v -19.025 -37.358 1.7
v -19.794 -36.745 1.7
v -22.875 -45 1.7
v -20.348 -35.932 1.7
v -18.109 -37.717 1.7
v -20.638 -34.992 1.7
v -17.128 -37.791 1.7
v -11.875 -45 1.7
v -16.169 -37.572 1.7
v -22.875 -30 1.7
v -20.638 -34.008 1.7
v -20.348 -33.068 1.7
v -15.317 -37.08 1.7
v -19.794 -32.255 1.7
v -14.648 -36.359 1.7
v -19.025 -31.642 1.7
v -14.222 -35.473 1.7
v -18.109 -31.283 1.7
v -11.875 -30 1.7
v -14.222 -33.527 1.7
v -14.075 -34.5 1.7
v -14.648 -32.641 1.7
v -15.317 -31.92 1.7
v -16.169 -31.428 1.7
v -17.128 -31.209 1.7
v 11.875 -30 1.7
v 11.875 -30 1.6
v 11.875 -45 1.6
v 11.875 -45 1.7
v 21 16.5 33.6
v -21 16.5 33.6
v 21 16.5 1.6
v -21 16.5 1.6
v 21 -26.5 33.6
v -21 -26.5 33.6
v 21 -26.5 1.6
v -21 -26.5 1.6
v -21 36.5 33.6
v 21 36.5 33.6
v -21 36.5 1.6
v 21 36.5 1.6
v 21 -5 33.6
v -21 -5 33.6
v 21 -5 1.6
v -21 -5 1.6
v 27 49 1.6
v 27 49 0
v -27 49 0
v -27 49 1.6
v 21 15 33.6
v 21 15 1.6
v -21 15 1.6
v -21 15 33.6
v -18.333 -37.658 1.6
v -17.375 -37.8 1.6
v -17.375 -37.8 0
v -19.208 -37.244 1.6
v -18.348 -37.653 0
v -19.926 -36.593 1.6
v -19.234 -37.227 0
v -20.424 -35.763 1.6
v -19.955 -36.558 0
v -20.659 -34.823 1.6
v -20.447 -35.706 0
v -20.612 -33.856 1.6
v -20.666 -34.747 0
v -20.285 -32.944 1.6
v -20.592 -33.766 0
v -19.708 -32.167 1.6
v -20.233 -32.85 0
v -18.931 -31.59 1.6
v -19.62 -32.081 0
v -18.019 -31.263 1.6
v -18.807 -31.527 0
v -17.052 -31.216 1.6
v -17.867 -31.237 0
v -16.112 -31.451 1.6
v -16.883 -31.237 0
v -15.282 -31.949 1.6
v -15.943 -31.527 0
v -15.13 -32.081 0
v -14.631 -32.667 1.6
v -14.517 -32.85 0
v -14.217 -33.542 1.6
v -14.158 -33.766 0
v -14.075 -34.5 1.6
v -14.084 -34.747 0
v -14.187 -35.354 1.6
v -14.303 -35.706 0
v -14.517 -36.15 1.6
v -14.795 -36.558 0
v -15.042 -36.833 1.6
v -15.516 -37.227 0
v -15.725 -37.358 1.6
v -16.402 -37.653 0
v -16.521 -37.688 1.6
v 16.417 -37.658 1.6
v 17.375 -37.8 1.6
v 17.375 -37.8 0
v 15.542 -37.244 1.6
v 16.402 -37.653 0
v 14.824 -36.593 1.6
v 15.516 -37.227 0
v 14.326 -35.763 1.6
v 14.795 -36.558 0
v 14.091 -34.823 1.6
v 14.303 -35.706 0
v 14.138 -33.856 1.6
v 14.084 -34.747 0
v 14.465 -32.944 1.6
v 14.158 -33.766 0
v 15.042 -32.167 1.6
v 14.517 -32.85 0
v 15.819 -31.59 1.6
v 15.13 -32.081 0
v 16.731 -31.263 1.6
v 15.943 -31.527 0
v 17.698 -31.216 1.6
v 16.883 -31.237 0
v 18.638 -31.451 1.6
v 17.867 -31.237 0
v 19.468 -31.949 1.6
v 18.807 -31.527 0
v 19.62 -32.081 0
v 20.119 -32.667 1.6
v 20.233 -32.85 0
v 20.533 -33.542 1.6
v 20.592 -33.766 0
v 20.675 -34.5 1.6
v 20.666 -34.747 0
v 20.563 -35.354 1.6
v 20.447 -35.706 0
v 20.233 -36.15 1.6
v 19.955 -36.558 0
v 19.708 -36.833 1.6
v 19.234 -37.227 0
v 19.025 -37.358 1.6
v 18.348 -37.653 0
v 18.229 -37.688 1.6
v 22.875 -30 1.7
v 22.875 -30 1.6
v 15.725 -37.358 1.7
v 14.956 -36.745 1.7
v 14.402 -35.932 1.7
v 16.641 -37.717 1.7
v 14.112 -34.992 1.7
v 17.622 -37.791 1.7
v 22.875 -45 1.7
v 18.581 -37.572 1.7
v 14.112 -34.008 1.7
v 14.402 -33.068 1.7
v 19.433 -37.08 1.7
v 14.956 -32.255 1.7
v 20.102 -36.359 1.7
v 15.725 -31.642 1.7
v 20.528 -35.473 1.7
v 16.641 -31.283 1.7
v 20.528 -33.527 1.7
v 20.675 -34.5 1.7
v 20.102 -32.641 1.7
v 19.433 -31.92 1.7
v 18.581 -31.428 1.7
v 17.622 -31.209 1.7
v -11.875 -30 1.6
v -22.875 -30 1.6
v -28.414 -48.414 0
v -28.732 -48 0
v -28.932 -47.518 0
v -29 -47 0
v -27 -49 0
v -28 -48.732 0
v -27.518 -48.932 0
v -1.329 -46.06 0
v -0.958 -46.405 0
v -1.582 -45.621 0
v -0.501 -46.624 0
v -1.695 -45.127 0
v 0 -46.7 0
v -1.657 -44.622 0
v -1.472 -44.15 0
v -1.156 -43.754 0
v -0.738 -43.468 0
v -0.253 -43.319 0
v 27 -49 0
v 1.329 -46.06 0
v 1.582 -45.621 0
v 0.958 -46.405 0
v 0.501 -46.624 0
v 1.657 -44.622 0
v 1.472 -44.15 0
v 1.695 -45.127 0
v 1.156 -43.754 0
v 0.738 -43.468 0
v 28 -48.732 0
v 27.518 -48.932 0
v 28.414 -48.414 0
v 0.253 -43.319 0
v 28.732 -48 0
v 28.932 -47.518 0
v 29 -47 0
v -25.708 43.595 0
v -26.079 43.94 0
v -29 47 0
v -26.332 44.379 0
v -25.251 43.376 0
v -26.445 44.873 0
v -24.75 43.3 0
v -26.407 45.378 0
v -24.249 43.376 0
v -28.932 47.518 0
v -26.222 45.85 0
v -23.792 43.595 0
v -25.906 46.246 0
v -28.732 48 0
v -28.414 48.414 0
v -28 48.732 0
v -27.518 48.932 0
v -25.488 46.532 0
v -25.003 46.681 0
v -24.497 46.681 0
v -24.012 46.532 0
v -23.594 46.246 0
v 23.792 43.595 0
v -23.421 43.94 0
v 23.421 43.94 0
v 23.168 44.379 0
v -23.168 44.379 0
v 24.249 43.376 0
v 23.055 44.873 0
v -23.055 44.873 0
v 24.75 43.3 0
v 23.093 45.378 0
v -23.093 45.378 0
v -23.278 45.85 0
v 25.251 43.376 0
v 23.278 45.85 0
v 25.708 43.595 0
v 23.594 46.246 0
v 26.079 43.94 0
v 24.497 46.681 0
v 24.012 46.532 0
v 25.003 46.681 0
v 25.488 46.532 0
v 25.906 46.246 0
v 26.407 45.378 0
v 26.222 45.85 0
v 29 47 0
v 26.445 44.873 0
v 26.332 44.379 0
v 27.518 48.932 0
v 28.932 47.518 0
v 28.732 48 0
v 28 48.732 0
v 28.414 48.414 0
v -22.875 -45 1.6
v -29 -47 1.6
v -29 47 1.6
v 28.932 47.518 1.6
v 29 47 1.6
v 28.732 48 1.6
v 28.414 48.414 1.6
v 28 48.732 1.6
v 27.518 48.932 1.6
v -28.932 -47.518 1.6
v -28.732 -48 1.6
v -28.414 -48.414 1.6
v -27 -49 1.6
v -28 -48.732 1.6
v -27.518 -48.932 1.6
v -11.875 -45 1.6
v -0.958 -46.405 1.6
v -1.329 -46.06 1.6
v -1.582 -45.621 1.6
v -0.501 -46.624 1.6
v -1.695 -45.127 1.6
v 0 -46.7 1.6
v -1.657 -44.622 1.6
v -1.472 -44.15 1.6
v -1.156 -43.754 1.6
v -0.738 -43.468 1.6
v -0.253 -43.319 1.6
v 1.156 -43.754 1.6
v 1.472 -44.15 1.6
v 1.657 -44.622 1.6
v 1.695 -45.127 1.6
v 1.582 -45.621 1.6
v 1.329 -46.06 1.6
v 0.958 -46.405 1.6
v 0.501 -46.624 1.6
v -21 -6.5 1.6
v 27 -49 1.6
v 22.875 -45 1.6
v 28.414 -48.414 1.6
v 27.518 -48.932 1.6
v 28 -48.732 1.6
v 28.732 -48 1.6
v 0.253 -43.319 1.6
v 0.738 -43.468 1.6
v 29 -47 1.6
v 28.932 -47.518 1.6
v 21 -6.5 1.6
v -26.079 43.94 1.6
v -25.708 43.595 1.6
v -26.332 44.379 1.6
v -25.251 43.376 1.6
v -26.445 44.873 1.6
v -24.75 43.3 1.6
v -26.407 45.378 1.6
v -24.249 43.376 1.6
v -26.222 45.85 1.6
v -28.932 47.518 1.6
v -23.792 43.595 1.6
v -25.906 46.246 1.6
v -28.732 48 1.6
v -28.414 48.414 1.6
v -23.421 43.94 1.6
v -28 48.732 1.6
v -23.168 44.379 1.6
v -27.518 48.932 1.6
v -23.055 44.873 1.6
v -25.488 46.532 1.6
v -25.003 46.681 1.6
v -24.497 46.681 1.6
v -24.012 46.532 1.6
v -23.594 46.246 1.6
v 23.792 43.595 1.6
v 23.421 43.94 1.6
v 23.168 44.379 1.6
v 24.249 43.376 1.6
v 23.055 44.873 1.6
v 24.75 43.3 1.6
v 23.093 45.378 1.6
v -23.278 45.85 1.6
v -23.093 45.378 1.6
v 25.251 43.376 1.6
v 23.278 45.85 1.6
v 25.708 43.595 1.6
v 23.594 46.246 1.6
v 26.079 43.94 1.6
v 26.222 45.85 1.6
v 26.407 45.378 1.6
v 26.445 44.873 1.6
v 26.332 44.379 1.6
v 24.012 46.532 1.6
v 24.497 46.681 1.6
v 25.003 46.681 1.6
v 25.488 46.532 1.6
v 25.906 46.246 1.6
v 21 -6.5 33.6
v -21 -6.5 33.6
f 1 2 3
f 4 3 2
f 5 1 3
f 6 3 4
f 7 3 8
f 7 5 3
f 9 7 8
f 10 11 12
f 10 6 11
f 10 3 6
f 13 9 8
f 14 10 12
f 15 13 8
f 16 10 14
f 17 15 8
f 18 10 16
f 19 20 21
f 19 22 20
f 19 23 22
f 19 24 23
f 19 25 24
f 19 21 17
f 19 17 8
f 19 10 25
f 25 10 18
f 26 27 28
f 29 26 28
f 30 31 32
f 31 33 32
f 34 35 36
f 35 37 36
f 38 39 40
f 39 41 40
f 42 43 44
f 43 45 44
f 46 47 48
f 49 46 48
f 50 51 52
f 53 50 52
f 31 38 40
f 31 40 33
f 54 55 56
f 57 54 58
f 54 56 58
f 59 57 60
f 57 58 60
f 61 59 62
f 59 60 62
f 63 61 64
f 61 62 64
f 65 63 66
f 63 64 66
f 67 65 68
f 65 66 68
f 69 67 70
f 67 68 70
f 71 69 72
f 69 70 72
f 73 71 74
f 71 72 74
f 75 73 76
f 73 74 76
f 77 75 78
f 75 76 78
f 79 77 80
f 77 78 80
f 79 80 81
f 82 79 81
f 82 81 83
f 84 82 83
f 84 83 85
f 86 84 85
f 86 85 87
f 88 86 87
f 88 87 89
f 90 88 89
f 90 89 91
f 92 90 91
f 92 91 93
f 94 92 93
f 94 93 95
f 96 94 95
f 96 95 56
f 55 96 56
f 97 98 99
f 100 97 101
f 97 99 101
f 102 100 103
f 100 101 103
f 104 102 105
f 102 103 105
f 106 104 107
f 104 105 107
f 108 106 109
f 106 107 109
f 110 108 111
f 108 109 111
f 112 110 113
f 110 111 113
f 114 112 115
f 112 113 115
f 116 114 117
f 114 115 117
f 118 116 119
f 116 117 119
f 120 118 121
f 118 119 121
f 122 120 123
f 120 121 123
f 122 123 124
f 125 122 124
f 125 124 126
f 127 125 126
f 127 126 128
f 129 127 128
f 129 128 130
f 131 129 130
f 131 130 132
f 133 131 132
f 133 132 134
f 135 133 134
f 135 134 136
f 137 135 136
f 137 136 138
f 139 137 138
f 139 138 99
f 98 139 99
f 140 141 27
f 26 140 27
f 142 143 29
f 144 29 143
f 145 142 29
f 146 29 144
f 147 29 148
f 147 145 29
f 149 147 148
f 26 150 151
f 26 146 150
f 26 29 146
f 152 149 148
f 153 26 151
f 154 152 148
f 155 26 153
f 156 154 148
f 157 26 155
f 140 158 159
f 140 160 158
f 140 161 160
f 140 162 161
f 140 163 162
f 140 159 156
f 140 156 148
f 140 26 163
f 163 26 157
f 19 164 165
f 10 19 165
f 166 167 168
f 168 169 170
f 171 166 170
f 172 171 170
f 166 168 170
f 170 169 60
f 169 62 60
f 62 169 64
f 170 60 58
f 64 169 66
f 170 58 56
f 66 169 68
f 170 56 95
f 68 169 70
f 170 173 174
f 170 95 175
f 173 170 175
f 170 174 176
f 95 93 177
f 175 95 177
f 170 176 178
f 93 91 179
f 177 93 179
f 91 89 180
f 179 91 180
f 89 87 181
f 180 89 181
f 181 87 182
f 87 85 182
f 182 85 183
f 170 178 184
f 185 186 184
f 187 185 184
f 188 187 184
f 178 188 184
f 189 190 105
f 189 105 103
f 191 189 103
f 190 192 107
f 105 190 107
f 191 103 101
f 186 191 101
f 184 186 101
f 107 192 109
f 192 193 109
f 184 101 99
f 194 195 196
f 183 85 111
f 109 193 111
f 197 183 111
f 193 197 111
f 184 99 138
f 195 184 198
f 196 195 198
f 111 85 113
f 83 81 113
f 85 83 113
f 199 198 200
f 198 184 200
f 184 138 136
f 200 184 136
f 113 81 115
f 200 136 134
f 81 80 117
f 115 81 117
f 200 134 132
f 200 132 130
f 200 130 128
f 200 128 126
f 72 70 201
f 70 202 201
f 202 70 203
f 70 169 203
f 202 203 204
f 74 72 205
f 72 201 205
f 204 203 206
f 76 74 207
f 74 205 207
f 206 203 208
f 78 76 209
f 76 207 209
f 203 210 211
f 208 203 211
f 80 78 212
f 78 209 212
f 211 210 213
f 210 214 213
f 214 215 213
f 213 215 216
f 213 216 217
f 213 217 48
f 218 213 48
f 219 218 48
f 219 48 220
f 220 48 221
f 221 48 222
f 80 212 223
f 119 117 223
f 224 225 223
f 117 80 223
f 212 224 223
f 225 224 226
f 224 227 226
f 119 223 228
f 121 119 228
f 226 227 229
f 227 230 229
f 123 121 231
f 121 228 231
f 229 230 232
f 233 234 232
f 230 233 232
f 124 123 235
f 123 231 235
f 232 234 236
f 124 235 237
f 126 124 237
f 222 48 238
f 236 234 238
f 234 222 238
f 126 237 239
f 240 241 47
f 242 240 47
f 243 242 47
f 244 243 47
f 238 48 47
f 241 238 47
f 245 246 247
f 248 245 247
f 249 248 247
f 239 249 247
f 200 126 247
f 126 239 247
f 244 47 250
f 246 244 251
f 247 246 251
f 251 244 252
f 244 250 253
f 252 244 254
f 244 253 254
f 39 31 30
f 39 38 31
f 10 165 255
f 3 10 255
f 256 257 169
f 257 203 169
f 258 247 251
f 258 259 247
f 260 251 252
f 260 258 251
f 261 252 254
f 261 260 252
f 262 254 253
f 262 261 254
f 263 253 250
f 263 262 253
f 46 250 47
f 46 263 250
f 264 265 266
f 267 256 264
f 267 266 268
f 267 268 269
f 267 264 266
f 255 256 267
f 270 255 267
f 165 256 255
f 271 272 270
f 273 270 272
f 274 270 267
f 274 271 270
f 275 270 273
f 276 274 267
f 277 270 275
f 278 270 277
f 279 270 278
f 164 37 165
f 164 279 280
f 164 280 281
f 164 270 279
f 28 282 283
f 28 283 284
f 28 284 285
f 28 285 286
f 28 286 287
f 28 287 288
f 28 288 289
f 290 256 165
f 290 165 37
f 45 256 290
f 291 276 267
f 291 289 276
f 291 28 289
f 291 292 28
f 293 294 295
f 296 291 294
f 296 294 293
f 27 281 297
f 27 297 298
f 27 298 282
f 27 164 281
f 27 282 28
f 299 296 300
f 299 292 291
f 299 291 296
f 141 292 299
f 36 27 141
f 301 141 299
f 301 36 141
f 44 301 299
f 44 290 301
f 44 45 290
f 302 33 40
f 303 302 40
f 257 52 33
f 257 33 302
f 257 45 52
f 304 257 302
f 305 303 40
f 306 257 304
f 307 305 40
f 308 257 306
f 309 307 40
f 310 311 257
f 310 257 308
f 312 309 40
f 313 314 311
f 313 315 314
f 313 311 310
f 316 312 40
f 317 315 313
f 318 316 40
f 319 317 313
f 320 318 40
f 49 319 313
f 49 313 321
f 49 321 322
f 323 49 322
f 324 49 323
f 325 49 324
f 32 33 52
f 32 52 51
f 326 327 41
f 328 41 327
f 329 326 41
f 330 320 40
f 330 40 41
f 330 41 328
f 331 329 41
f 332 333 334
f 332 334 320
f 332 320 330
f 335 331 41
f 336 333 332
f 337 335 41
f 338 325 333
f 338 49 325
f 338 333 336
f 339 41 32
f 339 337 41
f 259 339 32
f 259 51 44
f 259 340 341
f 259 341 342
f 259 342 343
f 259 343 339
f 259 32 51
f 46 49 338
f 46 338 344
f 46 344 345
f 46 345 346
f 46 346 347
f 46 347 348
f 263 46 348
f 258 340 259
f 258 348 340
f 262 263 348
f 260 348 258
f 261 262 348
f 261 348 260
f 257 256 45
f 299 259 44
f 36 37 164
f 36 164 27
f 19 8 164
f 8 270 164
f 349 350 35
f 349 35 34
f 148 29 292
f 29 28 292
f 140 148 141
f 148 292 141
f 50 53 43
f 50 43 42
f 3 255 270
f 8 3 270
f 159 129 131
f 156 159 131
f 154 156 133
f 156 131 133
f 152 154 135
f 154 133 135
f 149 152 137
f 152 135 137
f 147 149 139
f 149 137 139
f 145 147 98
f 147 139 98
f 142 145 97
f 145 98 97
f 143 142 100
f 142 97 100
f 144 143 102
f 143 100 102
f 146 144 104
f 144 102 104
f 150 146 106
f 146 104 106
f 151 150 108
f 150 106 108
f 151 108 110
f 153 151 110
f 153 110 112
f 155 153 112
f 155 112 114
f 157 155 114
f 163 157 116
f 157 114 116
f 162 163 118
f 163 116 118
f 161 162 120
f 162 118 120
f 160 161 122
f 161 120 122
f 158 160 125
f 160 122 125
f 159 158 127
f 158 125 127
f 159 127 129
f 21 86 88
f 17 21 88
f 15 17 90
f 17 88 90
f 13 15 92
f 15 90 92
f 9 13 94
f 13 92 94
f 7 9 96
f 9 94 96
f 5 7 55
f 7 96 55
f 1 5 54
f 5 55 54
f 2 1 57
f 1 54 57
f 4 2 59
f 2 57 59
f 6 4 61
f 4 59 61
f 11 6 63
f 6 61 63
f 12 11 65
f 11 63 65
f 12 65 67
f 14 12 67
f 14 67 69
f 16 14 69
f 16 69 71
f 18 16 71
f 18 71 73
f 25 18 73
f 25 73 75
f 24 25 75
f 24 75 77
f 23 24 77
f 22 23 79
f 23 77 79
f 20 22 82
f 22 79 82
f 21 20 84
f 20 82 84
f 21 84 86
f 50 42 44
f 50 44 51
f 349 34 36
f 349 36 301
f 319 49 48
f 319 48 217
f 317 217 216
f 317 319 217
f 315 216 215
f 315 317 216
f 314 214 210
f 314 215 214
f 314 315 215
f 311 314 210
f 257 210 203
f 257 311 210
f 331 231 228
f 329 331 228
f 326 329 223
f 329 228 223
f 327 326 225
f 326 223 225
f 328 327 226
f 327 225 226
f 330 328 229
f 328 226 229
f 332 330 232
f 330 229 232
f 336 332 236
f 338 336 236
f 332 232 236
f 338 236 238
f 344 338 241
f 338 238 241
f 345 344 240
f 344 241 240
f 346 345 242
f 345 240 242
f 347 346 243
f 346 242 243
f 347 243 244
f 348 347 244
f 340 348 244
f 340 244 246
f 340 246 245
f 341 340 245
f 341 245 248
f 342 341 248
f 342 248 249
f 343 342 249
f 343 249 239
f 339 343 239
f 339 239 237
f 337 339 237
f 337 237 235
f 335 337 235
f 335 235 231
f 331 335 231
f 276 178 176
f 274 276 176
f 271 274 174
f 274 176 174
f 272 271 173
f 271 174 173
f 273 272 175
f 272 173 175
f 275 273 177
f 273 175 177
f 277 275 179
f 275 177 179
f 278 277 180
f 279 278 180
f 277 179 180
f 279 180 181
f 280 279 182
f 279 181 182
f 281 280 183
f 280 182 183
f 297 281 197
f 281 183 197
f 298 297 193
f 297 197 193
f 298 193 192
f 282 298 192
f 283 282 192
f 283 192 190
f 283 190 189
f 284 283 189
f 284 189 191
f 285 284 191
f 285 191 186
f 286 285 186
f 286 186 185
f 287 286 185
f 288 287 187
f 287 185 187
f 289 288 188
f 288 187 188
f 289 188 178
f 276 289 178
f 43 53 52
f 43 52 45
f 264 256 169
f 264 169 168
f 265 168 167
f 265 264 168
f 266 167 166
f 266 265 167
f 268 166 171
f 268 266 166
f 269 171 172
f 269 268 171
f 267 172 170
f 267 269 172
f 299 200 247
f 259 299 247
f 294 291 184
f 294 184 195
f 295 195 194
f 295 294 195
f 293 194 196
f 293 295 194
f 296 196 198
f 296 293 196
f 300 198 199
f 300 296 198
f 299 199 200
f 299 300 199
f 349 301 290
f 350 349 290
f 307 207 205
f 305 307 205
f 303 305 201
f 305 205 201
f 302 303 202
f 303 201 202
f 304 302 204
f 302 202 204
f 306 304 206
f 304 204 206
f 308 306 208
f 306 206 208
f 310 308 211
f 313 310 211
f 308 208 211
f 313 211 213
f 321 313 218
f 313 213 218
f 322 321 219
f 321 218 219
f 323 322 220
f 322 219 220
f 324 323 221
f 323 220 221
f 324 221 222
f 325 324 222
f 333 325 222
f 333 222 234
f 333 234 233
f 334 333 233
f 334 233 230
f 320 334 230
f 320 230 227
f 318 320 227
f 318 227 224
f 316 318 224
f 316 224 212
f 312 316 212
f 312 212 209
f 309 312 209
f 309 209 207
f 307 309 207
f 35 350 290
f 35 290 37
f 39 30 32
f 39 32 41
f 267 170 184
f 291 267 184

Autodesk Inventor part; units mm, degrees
ref_plane "YZ Plane" through (0, 0, 0) normal (1, 0, 0) x (0, 1, 0)
ref_plane "XZ Plane" through (0, 0, 0) normal (0, 1, 0) x (-1, 0, 0)
ref_plane "XY Plane" through (0, 0, 0) normal (0, 0, 1) x (1, 0, 0)
sketch "Sketch1" plane through (0, 0, 0) normal (0, 0, 1) x (1, 0, 0)
  line L0 (-29, -49) -> (29, -49)
  line L1 (29, -49) -> (29, 49)
  line L2 (29, 49) -> (-29, 49)
  line L3 (-29, 49) -> (-29, -49)
  line L4 (-29, -49) -> (29, 49) construction
  line L5 (29, -49) -> (-29, 49) construction
  point P0 (0, 0)
  dimension "d0" = 58
  dimension "d1" = 98
extrude "Extrusion1" add sketch "Sketch1" along normal blind 1.6
sketch "Sketch2" plane through (0, 0, 1.6) normal (0, 0, 1) x (1, 0, 0)
  line L0 (-21, 16.5) -> (21, 16.5)
  line L1 (21, 16.5) -> (21, 36.5)
  line L2 (21, 36.5) -> (-21, 36.5)
  line L3 (-21, 36.5) -> (-21, 16.5)
  line L4 (-21, 16.5) -> (21, 36.5) construction
  line L5 (21, 16.5) -> (-21, 36.5) construction
  line L6 (-21, -5) -> (21, -5)
  line L7 (21, -5) -> (21, 15)
  line L8 (21, 15) -> (-21, 15)
  line L9 (-21, 15) -> (-21, -5)
  line L10 (-21, -5) -> (21, 15) construction
  line L11 (21, -5) -> (-21, 15) construction
  line L12 (-21, -26.5) -> (21, -26.5)
  line L13 (21, -26.5) -> (21, -6.5)
  line L14 (21, -6.5) -> (-21, -6.5)
  line L15 (-21, -6.5) -> (-21, -26.5)
  line L16 (-21, -26.5) -> (21, -6.5) construction
  line L17 (21, -26.5) -> (-21, -6.5) construction
  line L18 (-29, -49) -> (29, -49) projected
  line L19 (29, 49) -> (-29, 49) projected
  point P0 (0, 0)
  point P1 (0, 26.5)
  point P2 (0, 5)
  point P3 (0, -16.5)
  point P4 (0, 16.5)
  dimension "d4" = 42
  dimension "d5" = 20
  dimension "d6" = 20
  dimension "d7" = 20
  dimension "d8" = 1.5
  dimension "d9" = 1.5
  dimension "d31" = 12.5
extrude "Extrusion2" add sketch "Sketch2" along normal blind 32
sketch "Sketch3" plane through (0, 0, 1.6) normal (0, 0, 1) x (1, 0, 0)
  line L0 (-24.75, -45) -> (24.75, -45) construction
  line L1 (24.75, -45) -> (24.75, 45) construction
  line L2 (24.75, 45) -> (-24.75, 45) construction
  line L3 (-24.75, 45) -> (-24.75, -45) construction
  line L4 (-24.75, -45) -> (24.75, 45) construction
  line L5 (24.75, -45) -> (-24.75, 45) construction
  point P0 (0, 0)
  point P1 (0, -45)
  dimension "d13" = 90
  dimension "d14" = 49.5
hole "Hole1" at (-24.75, 45, 1.6) at (24.75, 45, 1.6) at (0, -45, 1.6) direction (0, 0, -1) diameter 3.4 depth 9.525 tip angle 118 clearance for "Countersunk Flat Head Screw DIN EN ISO 2009" size "M3" standard "DIN"
fillet "Fillet1" radius 2 4 edges at (29, 49, 0.8) (-29, 49, 0.8) (29, -49, 0.8) (-29, -49, 0.8)
sketch "Sketch4" plane through (0, 0, 1.6) normal (0, 0, 1) x (1, 0, 0)
  line L0 (-17.375, -34.5) -> (17.375, -34.5) construction
  circle A0 centre (24.75, -45) radius 1.7 construction
  line L1 (-27, -49) -> (27, -49) projected
  point P0 (0, 0)
  point P1 (0, -34.5)
  dimension "d23" = 34.75
  dimension "d32" = 14.5
hole "Hole2" at (-17.375, -34.5, 1.6) at (17.375, -34.5, 1.6) direction (0, 0, -1) diameter 6.6 depth 9.525 tip angle 118 clearance for "Countersunk Flat Head Screw DIN EN ISO 2009" size "M6" standard "DIN"
sketch "Sketch5" plane through (0, 0, 1.6) normal (0, 0, 1) x (1, 0, 0)
  point P0 (0, 0)
sketch "Sketch6" plane through (0, 0, 1.6) normal (0, 0, 1) x (1, 0, 0)
  line L0 (-22.875, -45) -> (-11.875, -45)
  line L1 (-11.875, -45) -> (-11.875, -30)
  line L2 (-11.875, -30) -> (-22.875, -30)
  line L3 (-22.875, -30) -> (-22.875, -45)
  line L4 (-22.875, -45) -> (-11.875, -30) construction
  line L5 (-11.875, -45) -> (-22.875, -30) construction
  line L6 (11.875, -45) -> (22.875, -45)
  line L7 (22.875, -45) -> (22.875, -30)
  line L8 (22.875, -30) -> (11.875, -30)
  line L9 (11.875, -30) -> (11.875, -45)
  line L10 (11.875, -45) -> (22.875, -30) construction
  line L11 (22.875, -45) -> (11.875, -30) construction
  circle A0 centre (-17.375, -34.5) radius 3.3 projected
  circle A1 centre (17.375, -34.5) radius 3.3 projected
  point P0 (0, 0)
  point P1 (-17.375, -37.5)
  point P2 (17.375, -37.5)
  point P3 (-17.375, -37.5)
  point P4 (17.375, -37.5)
  dimension "d33" = 3
  dimension "d34" = 11
  dimension "d35" = 11
  dimension "d36" = 15
extrude "Extrusion3" add sketch "Sketch6" along normal blind 0.1
properties part number "Cap_Platine"
